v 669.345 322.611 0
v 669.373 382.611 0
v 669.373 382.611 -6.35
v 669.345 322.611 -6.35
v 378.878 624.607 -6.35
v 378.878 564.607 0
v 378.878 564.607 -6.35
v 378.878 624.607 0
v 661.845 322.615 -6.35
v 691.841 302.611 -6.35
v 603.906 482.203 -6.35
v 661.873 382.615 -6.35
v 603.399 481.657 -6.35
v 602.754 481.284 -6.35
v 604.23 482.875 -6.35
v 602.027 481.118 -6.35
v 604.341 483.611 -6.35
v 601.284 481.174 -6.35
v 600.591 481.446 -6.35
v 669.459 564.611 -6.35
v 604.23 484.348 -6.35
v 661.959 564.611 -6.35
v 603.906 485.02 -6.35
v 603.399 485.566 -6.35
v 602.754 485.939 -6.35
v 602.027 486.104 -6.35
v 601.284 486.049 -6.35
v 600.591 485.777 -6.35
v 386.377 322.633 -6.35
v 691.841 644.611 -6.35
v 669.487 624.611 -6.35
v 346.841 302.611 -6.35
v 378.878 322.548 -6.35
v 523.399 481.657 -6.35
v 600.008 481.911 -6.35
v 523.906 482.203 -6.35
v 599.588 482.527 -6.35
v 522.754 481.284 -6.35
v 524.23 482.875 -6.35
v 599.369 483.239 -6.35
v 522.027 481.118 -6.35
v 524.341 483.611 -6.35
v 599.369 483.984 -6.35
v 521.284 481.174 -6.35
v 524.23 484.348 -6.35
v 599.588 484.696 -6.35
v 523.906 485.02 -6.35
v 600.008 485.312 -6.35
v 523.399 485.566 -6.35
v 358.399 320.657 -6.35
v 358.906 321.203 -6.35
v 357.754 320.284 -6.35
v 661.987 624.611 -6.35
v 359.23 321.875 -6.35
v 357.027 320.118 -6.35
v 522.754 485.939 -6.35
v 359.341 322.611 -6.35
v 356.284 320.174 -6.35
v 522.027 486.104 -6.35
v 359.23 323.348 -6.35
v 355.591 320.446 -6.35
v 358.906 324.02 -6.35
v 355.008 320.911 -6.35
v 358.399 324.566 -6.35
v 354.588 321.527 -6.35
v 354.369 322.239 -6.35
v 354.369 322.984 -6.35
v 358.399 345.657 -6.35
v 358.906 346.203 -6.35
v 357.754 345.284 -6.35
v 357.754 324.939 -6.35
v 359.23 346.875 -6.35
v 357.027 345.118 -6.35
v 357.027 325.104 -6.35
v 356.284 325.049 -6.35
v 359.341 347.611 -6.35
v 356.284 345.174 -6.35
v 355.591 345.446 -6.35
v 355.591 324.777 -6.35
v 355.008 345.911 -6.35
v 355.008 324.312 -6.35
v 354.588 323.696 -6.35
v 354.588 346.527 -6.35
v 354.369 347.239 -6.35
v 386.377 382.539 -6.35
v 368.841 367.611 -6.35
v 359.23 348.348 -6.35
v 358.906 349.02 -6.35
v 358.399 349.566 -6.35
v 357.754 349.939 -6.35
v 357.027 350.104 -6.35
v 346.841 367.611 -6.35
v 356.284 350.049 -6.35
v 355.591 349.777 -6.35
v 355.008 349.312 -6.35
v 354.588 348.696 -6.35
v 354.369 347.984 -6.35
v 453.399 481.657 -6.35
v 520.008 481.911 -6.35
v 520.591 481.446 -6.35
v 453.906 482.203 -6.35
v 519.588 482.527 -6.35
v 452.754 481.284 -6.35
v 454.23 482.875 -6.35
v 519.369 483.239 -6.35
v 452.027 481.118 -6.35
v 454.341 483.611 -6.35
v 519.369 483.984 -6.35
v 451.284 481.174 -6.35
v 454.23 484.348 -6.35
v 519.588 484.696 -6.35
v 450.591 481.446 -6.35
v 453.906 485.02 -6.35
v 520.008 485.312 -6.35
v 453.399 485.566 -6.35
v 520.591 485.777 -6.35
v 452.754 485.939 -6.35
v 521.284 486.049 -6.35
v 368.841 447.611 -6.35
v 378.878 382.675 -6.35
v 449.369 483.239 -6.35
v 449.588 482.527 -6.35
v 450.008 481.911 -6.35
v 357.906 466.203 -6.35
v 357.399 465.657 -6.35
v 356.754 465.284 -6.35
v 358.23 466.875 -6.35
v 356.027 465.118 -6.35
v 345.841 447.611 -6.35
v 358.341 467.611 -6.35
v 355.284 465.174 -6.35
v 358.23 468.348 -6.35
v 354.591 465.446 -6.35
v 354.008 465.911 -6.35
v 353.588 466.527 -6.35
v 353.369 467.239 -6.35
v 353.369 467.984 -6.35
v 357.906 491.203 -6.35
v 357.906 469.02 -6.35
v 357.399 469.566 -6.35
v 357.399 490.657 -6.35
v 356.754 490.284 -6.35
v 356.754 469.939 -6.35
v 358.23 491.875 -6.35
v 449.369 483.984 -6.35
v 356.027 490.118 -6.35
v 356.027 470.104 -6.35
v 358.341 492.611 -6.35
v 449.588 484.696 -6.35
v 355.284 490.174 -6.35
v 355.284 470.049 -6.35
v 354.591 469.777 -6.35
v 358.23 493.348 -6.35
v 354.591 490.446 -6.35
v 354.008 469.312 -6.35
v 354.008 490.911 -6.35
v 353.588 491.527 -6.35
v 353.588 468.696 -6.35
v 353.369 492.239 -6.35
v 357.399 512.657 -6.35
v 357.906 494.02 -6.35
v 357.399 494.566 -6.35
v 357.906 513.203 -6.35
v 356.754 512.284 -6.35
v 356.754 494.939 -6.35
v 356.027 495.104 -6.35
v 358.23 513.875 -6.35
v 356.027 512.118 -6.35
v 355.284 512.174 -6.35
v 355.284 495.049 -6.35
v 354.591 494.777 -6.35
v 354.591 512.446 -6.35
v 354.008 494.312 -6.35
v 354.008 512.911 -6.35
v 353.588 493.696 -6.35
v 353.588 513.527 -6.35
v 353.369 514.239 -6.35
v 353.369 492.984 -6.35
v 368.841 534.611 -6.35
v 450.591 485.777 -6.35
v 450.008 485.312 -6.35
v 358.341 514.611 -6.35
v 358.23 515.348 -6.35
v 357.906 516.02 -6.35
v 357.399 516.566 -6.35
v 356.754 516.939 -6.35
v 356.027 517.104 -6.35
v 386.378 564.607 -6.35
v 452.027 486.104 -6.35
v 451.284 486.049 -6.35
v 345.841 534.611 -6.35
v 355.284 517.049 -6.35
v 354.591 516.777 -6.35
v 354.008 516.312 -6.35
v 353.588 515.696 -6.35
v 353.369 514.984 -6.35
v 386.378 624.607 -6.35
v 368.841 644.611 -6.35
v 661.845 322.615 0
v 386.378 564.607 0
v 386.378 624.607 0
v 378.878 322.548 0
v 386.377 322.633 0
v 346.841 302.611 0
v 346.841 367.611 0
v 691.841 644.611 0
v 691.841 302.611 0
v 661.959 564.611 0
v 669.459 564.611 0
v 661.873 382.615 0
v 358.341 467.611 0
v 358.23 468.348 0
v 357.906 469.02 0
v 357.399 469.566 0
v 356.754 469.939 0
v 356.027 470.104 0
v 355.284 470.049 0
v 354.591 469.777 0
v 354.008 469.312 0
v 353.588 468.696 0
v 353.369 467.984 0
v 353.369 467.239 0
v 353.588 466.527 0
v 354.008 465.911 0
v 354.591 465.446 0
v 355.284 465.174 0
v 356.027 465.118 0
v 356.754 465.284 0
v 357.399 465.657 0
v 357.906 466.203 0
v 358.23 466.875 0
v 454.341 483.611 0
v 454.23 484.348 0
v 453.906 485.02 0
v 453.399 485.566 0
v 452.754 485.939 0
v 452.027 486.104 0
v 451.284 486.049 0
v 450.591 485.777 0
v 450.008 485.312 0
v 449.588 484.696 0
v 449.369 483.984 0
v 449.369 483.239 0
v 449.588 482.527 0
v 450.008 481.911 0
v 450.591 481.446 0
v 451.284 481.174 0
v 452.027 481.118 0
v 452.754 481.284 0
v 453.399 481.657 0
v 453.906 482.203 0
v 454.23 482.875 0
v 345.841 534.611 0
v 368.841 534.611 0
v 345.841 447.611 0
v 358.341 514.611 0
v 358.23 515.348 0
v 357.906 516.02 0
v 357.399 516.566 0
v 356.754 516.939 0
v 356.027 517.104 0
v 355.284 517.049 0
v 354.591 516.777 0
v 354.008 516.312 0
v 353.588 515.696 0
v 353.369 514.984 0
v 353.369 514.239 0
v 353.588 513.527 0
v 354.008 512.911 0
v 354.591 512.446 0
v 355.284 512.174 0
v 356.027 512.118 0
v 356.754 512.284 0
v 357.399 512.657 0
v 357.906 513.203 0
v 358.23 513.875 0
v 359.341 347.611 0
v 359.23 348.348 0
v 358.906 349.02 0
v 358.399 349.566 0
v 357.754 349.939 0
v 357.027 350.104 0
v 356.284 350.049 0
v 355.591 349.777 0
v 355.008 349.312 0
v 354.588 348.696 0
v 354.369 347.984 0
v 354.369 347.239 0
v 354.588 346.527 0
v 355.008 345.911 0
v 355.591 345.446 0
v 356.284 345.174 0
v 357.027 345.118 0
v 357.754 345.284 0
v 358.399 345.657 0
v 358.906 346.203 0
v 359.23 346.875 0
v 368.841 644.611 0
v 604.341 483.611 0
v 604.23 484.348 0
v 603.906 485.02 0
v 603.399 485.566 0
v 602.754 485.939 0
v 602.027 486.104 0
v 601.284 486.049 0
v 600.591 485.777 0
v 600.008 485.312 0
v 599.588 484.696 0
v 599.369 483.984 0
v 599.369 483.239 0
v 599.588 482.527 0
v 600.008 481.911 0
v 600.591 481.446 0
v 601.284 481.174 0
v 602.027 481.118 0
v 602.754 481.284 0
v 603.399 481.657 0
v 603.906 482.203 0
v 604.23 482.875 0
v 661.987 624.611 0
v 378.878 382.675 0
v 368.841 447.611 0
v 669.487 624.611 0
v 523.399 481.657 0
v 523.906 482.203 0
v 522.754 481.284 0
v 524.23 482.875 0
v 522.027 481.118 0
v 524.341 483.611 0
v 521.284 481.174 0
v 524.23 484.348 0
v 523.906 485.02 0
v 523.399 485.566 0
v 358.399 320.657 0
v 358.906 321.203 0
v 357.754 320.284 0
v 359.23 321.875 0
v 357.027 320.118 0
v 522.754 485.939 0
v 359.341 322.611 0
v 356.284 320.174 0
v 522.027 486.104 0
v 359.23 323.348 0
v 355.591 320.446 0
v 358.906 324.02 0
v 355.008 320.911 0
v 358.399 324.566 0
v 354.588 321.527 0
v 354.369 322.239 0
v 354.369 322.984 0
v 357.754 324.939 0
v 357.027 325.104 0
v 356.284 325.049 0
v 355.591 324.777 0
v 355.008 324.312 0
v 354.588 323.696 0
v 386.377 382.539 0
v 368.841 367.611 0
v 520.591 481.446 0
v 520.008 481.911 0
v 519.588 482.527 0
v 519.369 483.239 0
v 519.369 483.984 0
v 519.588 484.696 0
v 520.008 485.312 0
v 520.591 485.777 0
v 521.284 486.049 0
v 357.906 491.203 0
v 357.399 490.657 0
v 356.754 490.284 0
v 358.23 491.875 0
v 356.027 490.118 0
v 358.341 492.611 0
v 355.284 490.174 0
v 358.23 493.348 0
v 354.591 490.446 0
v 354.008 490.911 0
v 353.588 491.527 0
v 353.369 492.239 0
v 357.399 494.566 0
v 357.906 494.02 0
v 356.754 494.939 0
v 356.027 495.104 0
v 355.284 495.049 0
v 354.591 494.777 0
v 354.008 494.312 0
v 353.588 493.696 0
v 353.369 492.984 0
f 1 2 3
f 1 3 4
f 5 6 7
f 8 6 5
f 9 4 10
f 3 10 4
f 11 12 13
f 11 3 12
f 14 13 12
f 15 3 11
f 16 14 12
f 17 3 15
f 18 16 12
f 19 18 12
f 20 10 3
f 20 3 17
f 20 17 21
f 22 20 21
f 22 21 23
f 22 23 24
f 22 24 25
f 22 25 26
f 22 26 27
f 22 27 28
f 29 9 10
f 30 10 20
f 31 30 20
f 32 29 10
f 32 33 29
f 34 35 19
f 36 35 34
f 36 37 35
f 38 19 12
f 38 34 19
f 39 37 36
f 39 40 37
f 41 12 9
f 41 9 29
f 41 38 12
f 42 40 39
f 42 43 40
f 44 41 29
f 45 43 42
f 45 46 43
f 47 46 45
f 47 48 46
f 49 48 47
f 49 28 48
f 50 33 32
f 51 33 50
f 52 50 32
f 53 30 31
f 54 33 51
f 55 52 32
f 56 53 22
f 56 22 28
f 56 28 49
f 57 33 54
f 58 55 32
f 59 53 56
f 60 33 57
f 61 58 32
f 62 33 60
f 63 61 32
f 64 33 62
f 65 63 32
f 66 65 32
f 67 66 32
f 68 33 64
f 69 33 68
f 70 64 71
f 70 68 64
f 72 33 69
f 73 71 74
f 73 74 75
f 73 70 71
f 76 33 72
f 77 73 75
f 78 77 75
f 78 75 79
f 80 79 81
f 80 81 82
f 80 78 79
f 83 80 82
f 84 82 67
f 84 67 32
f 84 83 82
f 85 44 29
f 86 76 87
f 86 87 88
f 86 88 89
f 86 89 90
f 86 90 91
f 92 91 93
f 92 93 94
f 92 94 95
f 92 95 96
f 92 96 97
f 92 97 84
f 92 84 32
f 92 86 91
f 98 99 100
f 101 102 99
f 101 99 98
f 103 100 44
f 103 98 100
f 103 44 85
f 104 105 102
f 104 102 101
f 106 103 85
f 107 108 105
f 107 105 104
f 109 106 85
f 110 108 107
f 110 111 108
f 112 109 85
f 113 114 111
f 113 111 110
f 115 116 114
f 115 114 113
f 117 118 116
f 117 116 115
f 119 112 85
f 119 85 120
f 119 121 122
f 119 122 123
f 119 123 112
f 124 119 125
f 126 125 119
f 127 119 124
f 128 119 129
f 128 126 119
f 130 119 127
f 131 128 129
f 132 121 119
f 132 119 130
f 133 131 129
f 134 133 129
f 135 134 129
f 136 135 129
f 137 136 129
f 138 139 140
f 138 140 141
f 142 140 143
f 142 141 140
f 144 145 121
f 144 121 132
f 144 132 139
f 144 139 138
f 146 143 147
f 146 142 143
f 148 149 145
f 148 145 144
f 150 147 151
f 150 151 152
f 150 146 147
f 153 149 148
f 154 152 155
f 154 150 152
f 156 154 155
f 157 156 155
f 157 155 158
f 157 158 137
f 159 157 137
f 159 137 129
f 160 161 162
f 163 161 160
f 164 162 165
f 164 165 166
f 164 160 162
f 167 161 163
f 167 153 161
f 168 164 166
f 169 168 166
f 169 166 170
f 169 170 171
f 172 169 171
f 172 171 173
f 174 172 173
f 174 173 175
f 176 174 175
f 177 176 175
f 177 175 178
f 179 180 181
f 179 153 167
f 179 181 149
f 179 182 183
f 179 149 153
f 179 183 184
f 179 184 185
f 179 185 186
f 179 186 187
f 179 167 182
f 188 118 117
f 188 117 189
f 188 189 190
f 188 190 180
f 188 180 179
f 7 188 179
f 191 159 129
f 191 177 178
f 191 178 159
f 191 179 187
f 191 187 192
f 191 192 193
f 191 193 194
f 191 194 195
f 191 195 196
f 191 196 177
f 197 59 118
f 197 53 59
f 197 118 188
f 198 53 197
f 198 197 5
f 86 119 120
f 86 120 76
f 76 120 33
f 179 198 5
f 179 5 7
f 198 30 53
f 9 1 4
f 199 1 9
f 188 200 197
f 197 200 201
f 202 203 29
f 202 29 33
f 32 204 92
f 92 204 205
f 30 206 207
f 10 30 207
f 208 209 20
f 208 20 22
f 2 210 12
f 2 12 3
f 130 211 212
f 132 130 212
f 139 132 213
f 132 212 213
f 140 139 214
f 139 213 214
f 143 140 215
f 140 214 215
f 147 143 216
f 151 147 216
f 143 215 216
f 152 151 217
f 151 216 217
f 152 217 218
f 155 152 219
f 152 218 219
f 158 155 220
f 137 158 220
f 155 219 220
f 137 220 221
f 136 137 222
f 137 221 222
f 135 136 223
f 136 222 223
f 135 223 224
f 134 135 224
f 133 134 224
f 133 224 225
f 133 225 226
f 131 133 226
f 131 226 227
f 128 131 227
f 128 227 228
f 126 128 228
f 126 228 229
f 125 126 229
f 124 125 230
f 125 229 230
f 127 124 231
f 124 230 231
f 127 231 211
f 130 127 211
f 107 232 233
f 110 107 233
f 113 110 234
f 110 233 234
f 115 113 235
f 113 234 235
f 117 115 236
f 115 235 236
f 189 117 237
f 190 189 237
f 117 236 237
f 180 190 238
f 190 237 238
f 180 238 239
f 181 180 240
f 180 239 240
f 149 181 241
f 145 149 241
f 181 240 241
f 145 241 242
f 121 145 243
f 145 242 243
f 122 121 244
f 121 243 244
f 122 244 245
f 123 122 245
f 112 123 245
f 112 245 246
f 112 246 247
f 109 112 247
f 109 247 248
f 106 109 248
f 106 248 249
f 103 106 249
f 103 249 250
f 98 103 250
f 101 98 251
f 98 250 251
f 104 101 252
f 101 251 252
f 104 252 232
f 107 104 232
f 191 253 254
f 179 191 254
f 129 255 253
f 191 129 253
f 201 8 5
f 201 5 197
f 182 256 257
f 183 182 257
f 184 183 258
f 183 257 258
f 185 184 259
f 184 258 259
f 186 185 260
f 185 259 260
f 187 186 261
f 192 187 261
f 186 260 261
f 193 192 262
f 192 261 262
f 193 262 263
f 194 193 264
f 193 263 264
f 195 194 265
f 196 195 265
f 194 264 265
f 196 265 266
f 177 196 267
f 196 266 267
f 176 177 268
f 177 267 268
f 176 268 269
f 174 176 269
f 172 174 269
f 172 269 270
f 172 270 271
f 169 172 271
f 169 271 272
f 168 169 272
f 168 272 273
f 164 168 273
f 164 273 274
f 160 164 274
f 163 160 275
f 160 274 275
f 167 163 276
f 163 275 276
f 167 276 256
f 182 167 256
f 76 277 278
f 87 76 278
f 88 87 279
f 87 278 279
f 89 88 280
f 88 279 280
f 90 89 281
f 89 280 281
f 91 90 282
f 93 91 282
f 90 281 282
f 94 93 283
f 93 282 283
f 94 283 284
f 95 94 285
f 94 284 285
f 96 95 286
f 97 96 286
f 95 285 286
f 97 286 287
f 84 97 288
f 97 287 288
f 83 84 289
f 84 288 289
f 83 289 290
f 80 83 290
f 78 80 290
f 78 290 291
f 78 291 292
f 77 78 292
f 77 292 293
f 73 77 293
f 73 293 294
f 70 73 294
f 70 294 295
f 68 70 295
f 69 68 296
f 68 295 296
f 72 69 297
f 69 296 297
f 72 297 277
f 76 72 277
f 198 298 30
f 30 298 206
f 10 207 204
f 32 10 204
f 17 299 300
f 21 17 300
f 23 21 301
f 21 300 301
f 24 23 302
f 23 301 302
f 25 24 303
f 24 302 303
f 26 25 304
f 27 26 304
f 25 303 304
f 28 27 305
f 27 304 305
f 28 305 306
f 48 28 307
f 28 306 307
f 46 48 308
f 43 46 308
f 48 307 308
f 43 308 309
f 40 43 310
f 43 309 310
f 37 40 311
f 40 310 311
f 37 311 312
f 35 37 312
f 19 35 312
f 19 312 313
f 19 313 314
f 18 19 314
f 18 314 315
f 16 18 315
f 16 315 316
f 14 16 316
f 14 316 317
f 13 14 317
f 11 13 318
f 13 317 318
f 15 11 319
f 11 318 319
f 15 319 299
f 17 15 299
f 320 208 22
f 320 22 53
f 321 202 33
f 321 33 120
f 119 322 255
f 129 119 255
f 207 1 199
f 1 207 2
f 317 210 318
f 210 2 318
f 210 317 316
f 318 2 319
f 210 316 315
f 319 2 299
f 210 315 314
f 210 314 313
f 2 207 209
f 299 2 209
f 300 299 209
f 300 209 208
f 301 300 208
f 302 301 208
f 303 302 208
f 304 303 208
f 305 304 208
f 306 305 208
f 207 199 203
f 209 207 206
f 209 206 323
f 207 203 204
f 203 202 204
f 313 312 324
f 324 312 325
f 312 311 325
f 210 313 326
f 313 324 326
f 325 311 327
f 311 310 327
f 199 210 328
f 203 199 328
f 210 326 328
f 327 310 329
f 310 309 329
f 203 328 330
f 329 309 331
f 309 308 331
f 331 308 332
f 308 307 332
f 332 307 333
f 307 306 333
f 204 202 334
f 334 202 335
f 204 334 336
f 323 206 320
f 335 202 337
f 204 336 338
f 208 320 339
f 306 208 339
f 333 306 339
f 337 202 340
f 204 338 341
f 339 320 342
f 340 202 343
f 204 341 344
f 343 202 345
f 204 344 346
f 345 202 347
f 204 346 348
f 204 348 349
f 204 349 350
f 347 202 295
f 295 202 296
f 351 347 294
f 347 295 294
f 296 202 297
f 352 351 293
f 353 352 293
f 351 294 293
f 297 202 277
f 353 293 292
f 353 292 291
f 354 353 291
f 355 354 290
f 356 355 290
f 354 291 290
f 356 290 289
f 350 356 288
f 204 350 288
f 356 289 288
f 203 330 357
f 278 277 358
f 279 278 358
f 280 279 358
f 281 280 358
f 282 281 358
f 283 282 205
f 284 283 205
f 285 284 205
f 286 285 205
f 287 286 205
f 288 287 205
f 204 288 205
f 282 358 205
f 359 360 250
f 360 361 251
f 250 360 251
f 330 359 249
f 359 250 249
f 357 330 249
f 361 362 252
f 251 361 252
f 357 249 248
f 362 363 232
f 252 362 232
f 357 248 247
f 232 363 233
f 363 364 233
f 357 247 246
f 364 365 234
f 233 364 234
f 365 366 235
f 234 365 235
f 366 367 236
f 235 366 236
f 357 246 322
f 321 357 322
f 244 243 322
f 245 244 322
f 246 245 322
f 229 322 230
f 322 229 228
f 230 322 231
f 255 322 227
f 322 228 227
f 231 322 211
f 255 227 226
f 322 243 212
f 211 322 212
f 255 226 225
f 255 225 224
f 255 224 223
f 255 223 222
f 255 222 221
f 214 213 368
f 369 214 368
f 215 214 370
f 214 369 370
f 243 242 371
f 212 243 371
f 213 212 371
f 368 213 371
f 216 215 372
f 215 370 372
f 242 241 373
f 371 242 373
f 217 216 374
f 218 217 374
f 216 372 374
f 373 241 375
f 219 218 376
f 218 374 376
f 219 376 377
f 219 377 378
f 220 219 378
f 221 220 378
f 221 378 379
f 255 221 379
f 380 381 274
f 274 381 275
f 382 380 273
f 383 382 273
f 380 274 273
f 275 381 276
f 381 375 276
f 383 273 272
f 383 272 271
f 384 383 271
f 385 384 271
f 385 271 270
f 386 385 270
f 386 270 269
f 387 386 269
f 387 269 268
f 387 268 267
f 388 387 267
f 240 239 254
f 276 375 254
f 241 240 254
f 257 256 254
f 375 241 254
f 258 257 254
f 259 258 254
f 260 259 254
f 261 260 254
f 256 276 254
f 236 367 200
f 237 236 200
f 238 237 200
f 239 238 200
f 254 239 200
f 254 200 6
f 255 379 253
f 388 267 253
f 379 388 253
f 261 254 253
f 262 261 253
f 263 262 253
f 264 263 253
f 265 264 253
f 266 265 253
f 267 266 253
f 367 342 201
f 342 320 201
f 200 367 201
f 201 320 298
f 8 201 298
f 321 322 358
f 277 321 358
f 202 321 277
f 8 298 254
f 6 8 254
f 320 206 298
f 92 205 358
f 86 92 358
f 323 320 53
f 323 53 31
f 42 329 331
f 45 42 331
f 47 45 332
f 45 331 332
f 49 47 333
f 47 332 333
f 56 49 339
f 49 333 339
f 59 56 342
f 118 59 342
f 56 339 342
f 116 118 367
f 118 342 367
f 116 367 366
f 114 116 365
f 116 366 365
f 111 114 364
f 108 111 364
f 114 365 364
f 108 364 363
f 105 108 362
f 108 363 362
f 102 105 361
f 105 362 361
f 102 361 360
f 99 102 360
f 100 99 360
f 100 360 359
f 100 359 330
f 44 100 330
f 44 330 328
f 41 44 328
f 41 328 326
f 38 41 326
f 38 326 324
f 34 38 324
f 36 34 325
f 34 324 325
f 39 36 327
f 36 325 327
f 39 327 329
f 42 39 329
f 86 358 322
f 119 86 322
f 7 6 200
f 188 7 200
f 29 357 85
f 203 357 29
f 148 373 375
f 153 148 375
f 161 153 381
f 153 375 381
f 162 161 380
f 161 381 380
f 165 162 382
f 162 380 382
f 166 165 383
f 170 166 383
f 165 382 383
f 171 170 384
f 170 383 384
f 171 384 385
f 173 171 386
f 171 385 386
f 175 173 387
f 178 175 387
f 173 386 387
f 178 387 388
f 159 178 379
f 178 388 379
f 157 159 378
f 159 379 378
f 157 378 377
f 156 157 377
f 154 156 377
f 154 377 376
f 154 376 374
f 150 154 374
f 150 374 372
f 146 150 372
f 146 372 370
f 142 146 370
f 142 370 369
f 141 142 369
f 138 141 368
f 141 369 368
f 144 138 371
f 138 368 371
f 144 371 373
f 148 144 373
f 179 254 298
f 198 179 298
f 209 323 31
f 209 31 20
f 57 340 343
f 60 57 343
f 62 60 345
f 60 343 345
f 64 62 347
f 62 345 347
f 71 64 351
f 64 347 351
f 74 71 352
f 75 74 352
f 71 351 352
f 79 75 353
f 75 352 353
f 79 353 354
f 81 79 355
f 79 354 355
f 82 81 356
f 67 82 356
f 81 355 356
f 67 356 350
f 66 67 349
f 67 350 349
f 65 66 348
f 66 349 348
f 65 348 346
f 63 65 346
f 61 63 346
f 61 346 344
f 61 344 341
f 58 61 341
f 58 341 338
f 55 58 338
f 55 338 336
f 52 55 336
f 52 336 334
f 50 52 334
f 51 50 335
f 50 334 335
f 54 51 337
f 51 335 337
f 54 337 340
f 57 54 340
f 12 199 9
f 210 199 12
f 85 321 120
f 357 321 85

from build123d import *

# Parameters (mm, degrees)
MODEL_R             = 2.5
MODEL_W             = 7.5
MODEL_H             = 60.000012028
BOSS_EXTRUDE1_DEPTH = 6.35


with BuildPart() as part:
    # Model → Boss-Extrude1 (new body)
    with BuildSketch(Plane.XY):
        Polygon((691.840616937, 302.611489719), (346.840616937, 302.611489719), (346.840616937, 367.611489719), (368.840616937, 367.611489719), (368.840616937, 447.611489719), (345.840616937, 447.611489719), (345.840616937, 534.611489719), (368.840616937, 534.611489719), (368.840616937, 644.611489719), (691.840616937, 644.611489719), align=None)
        with Locations((355.840616937, 514.611489719)):
            Circle(MODEL_R, mode=Mode.SUBTRACT)
        with Locations((355.840616937, 492.611489719)):
            Circle(MODEL_R, mode=Mode.SUBTRACT)
        with Locations((355.840616937, 467.611489719)):
            Circle(MODEL_R, mode=Mode.SUBTRACT)
        with Locations((356.840616937, 347.611489719)):
            Circle(MODEL_R, mode=Mode.SUBTRACT)
        with Locations((356.840616937, 322.611489719)):
            Circle(MODEL_R, mode=Mode.SUBTRACT)
        with Locations((451.840616937, 483.611489719)):
            Circle(MODEL_R, mode=Mode.SUBTRACT)
        with Locations((521.840616937, 483.611489719)):
            Circle(MODEL_R, mode=Mode.SUBTRACT)
        with Locations((601.840616937, 483.611489719)):
            Circle(MODEL_R, mode=Mode.SUBTRACT)
        with Locations((382.628249379, 594.607051385)):
            Rectangle(MODEL_W, MODEL_H, mode=Mode.SUBTRACT)
        Polygon((378.878249379, 382.675054085), (386.377012819, 382.538867187), (386.377012819, 322.632601599), (378.878249379, 322.547926114), align=None, mode=Mode.SUBTRACT)
        Polygon((661.987313401, 624.611489719), (669.487313401, 624.611489719), (669.459063879, 564.611489719), (661.959063879, 564.611489719), align=None, mode=Mode.SUBTRACT)
        Polygon((661.873375206, 382.614770073), (669.373373543, 382.611238884), (669.345124024, 322.611245534), (661.845125687, 322.614776724), align=None, mode=Mode.SUBTRACT)
    extrude(amount=-BOSS_EXTRUDE1_DEPTH)


solid = part.part
